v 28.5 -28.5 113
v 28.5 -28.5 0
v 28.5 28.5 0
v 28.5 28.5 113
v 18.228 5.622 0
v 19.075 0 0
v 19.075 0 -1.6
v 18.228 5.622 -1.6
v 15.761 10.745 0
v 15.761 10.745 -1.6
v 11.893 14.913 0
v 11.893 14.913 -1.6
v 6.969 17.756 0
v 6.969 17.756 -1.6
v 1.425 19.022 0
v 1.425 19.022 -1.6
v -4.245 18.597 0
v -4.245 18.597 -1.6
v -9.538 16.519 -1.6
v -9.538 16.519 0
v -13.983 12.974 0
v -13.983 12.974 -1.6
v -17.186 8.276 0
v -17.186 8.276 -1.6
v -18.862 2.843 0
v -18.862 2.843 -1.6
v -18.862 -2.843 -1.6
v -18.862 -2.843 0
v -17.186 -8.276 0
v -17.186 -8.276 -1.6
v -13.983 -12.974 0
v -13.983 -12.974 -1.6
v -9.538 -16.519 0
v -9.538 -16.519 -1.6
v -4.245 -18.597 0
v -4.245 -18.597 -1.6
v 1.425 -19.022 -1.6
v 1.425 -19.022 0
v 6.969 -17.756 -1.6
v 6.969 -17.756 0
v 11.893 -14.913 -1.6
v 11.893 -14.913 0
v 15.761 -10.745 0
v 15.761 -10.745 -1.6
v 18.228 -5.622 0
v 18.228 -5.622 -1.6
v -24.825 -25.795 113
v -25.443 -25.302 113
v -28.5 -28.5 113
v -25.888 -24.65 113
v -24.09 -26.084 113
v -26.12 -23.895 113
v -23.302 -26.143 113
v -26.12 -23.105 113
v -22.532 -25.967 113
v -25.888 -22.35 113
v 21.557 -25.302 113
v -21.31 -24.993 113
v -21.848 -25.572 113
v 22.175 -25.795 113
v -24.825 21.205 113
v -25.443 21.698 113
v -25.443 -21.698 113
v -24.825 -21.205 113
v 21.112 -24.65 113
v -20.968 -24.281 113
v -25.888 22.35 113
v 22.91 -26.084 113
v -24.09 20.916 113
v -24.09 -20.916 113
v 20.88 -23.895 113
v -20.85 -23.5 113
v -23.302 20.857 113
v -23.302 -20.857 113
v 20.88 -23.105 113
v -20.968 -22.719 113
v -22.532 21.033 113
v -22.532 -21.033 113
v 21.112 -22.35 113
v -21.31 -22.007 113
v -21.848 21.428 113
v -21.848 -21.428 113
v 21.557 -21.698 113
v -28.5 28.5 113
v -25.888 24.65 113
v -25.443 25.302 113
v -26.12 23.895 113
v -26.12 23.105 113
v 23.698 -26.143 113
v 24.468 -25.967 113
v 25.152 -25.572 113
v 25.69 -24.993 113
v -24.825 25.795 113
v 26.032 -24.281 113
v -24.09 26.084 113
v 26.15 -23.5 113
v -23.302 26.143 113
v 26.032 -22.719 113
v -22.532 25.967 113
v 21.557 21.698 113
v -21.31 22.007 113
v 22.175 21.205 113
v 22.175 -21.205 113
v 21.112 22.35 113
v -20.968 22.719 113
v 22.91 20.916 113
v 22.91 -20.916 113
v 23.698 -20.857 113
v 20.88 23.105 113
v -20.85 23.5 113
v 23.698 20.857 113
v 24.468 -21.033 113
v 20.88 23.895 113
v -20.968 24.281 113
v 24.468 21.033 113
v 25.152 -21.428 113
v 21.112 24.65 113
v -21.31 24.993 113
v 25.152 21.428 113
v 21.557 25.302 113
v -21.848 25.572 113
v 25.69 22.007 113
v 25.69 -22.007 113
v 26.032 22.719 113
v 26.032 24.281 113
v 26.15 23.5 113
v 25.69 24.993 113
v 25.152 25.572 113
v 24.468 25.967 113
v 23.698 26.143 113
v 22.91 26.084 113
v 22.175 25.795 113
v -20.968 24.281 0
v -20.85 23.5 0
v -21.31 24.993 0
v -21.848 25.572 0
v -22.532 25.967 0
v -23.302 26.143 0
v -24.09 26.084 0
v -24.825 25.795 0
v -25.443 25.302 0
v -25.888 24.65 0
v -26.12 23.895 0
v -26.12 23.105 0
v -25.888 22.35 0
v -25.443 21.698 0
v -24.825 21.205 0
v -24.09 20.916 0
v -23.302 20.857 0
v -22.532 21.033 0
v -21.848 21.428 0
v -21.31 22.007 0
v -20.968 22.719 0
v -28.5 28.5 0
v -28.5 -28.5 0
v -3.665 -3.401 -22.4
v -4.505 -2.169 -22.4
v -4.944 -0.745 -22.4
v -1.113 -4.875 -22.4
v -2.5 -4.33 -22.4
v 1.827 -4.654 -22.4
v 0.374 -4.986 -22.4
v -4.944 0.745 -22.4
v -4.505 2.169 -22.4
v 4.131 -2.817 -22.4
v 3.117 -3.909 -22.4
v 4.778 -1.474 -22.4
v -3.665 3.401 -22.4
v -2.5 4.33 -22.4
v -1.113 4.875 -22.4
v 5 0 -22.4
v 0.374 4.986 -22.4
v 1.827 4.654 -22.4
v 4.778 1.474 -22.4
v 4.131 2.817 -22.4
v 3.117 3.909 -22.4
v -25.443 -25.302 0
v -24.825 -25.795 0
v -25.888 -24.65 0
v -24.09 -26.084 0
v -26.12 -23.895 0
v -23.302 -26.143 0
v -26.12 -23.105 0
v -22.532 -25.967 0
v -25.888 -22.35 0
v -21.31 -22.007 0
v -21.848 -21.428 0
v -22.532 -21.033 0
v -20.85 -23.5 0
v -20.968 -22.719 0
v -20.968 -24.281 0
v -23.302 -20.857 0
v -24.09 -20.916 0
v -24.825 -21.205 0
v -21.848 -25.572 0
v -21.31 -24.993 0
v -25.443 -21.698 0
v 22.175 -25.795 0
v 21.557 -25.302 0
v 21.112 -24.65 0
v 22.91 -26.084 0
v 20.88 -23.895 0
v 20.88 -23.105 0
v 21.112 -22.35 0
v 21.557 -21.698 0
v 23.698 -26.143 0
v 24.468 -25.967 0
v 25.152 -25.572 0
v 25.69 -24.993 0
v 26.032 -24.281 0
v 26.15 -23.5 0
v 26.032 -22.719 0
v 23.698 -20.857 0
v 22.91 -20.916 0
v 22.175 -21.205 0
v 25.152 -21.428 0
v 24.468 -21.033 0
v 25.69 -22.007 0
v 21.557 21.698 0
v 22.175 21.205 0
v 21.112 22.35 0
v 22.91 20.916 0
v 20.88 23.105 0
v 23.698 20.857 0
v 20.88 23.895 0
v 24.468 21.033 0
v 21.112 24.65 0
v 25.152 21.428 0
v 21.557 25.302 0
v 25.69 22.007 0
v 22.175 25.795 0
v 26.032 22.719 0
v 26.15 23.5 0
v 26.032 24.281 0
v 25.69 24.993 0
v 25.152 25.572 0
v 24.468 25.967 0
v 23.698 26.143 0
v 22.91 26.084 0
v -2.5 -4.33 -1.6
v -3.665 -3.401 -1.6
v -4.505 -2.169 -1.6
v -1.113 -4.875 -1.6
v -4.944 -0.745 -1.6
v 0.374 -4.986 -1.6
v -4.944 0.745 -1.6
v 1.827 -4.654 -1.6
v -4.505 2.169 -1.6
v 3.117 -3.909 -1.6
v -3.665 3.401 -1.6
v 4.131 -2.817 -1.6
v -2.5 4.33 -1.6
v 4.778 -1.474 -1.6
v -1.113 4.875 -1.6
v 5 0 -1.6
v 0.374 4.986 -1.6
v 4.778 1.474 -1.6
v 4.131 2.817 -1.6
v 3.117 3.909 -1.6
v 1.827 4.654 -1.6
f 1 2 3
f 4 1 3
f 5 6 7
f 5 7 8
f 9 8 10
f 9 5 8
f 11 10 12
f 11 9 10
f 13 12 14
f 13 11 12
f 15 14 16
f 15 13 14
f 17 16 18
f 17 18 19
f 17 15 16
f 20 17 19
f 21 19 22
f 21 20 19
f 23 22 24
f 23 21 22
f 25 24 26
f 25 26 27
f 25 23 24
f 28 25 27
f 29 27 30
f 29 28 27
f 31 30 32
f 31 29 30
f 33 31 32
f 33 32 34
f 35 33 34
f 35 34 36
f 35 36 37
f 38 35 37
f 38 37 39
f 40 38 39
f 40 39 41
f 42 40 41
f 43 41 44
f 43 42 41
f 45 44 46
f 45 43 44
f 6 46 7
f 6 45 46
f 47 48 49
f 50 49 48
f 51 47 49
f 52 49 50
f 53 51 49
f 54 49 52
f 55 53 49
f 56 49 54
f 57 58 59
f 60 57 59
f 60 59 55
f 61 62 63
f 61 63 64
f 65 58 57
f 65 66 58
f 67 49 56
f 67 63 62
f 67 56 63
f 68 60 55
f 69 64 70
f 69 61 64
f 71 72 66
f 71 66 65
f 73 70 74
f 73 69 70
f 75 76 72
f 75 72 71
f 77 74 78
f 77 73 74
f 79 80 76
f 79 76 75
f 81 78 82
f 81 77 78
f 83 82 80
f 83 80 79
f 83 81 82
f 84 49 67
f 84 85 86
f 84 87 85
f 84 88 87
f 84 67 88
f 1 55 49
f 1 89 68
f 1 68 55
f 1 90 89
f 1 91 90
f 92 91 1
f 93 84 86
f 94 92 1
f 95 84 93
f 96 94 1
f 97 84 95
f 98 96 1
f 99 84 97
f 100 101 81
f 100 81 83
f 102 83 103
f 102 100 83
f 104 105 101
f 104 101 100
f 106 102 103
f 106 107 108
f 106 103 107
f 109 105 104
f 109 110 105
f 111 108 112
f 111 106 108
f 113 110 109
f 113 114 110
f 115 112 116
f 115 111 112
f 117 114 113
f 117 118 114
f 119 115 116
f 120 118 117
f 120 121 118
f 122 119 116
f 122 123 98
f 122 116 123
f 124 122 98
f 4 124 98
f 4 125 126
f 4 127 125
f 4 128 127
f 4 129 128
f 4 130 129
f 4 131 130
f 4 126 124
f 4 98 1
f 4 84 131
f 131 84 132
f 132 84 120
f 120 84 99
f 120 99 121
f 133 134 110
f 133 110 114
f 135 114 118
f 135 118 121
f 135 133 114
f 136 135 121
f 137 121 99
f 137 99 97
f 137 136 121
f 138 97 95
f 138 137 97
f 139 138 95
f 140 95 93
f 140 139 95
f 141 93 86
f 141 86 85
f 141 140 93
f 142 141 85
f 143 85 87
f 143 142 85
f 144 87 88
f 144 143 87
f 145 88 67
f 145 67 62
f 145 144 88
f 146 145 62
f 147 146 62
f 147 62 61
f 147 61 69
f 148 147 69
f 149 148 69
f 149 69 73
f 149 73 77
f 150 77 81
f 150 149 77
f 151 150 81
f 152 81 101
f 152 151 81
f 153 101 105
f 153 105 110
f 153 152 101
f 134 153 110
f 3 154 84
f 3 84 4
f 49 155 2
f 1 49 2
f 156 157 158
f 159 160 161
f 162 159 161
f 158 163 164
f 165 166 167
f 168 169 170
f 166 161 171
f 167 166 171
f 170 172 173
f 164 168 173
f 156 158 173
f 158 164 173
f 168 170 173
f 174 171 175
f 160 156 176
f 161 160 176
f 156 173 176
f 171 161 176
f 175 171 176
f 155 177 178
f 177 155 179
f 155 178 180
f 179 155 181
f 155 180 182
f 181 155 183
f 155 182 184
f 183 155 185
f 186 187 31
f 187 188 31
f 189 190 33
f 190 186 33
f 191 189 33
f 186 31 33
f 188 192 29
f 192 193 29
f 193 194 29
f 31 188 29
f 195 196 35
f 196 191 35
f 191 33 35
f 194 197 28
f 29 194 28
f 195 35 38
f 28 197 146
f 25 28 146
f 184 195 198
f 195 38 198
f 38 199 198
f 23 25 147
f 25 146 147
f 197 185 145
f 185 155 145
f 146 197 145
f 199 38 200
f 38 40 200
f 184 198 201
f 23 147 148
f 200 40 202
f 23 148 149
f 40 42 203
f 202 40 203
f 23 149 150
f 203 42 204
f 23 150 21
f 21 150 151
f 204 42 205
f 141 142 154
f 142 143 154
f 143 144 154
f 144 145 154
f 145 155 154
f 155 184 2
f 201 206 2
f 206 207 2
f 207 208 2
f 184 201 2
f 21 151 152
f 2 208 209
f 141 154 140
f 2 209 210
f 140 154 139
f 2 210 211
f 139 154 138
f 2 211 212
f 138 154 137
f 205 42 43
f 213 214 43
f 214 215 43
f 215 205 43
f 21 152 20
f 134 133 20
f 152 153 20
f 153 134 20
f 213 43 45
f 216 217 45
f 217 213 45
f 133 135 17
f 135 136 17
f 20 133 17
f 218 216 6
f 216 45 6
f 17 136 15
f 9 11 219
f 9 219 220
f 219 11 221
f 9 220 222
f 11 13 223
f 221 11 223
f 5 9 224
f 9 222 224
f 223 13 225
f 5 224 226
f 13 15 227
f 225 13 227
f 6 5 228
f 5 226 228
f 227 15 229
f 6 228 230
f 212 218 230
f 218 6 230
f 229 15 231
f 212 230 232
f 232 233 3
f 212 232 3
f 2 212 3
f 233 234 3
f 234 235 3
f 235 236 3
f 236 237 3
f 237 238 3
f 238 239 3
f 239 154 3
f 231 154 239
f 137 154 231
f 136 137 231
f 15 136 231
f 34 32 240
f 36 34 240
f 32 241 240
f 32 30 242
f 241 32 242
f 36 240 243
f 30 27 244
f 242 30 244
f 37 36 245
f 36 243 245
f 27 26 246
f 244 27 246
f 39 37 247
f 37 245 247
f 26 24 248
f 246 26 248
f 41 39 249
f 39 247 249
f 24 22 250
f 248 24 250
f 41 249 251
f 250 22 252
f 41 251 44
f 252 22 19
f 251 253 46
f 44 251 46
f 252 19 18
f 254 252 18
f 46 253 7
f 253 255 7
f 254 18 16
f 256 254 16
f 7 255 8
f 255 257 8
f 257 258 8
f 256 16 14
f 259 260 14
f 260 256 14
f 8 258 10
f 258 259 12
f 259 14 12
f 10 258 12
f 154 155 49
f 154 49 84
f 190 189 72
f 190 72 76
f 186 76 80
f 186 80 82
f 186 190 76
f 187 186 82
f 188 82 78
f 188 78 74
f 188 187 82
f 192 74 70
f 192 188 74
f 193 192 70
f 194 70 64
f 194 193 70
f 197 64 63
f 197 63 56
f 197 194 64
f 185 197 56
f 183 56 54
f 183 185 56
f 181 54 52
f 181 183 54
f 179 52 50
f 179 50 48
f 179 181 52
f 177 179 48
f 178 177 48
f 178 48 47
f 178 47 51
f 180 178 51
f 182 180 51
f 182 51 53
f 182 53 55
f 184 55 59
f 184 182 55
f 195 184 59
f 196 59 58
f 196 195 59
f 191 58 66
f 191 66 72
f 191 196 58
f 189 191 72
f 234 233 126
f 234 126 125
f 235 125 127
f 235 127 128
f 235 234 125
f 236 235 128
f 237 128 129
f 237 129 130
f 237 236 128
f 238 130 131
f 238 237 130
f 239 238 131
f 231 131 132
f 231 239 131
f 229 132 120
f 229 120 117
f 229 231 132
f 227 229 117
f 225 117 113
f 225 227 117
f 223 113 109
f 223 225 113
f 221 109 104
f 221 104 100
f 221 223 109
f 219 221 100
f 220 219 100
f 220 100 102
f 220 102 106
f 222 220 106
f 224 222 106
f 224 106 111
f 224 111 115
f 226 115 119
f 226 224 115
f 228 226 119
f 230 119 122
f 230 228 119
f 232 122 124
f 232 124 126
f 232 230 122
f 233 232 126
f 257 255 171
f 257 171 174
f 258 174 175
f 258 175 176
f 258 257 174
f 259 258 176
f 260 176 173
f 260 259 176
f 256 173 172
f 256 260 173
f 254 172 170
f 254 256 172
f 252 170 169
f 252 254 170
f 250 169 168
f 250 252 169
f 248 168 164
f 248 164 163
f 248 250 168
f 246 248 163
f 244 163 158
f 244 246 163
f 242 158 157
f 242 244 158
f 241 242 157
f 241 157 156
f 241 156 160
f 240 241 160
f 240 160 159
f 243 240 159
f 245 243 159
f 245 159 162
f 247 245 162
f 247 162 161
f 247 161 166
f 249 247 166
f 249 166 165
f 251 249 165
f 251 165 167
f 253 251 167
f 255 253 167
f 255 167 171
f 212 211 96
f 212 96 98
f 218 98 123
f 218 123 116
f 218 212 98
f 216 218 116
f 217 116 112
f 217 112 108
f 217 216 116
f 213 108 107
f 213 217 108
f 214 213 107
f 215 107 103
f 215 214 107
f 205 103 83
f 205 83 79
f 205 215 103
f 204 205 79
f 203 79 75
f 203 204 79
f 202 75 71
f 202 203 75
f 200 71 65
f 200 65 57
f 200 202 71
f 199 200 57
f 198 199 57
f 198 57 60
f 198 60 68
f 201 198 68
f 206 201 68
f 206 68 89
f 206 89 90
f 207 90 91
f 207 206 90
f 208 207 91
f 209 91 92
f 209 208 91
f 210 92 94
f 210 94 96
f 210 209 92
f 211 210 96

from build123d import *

# Parameters (mm, degrees)
SKETCH1_W           = 57
SKETCH1_H           = 57
SKETCH1_R           = 2.65
BOSS_EXTRUDE1_DEPTH = 113
SKETCH2_R           = 19.075
BOSS_EXTRUDE2_DEPTH = 1.6
SKETCH3_R           = 5
BOSS_EXTRUDE3_DEPTH = 22.4


with BuildPart() as part:
    # Sketch1 → Boss-Extrude1 (new body)
    with BuildSketch(Plane.XY):
        Rectangle(SKETCH1_W, SKETCH1_H)
        with Locations((-23.5, 23.5)):
            Circle(SKETCH1_R, mode=Mode.SUBTRACT)
        with Locations((23.5, 23.5)):
            Circle(SKETCH1_R, mode=Mode.SUBTRACT)
        with Locations((23.5, -23.5)):
            Circle(SKETCH1_R, mode=Mode.SUBTRACT)
        with Locations((-23.5, -23.5)):
            Circle(SKETCH1_R, mode=Mode.SUBTRACT)
    extrude(amount=BOSS_EXTRUDE1_DEPTH)

    # Sketch2 → Boss-Extrude2 (add)
    with BuildSketch(Plane.XY):
        Circle(SKETCH2_R)
    extrude(amount=-BOSS_EXTRUDE2_DEPTH)

    # Sketch3 → Boss-Extrude3 (add)
    with BuildSketch(Plane.XY):
        Circle(SKETCH3_R)
    extrude(amount=-BOSS_EXTRUDE3_DEPTH)


solid = part.part
